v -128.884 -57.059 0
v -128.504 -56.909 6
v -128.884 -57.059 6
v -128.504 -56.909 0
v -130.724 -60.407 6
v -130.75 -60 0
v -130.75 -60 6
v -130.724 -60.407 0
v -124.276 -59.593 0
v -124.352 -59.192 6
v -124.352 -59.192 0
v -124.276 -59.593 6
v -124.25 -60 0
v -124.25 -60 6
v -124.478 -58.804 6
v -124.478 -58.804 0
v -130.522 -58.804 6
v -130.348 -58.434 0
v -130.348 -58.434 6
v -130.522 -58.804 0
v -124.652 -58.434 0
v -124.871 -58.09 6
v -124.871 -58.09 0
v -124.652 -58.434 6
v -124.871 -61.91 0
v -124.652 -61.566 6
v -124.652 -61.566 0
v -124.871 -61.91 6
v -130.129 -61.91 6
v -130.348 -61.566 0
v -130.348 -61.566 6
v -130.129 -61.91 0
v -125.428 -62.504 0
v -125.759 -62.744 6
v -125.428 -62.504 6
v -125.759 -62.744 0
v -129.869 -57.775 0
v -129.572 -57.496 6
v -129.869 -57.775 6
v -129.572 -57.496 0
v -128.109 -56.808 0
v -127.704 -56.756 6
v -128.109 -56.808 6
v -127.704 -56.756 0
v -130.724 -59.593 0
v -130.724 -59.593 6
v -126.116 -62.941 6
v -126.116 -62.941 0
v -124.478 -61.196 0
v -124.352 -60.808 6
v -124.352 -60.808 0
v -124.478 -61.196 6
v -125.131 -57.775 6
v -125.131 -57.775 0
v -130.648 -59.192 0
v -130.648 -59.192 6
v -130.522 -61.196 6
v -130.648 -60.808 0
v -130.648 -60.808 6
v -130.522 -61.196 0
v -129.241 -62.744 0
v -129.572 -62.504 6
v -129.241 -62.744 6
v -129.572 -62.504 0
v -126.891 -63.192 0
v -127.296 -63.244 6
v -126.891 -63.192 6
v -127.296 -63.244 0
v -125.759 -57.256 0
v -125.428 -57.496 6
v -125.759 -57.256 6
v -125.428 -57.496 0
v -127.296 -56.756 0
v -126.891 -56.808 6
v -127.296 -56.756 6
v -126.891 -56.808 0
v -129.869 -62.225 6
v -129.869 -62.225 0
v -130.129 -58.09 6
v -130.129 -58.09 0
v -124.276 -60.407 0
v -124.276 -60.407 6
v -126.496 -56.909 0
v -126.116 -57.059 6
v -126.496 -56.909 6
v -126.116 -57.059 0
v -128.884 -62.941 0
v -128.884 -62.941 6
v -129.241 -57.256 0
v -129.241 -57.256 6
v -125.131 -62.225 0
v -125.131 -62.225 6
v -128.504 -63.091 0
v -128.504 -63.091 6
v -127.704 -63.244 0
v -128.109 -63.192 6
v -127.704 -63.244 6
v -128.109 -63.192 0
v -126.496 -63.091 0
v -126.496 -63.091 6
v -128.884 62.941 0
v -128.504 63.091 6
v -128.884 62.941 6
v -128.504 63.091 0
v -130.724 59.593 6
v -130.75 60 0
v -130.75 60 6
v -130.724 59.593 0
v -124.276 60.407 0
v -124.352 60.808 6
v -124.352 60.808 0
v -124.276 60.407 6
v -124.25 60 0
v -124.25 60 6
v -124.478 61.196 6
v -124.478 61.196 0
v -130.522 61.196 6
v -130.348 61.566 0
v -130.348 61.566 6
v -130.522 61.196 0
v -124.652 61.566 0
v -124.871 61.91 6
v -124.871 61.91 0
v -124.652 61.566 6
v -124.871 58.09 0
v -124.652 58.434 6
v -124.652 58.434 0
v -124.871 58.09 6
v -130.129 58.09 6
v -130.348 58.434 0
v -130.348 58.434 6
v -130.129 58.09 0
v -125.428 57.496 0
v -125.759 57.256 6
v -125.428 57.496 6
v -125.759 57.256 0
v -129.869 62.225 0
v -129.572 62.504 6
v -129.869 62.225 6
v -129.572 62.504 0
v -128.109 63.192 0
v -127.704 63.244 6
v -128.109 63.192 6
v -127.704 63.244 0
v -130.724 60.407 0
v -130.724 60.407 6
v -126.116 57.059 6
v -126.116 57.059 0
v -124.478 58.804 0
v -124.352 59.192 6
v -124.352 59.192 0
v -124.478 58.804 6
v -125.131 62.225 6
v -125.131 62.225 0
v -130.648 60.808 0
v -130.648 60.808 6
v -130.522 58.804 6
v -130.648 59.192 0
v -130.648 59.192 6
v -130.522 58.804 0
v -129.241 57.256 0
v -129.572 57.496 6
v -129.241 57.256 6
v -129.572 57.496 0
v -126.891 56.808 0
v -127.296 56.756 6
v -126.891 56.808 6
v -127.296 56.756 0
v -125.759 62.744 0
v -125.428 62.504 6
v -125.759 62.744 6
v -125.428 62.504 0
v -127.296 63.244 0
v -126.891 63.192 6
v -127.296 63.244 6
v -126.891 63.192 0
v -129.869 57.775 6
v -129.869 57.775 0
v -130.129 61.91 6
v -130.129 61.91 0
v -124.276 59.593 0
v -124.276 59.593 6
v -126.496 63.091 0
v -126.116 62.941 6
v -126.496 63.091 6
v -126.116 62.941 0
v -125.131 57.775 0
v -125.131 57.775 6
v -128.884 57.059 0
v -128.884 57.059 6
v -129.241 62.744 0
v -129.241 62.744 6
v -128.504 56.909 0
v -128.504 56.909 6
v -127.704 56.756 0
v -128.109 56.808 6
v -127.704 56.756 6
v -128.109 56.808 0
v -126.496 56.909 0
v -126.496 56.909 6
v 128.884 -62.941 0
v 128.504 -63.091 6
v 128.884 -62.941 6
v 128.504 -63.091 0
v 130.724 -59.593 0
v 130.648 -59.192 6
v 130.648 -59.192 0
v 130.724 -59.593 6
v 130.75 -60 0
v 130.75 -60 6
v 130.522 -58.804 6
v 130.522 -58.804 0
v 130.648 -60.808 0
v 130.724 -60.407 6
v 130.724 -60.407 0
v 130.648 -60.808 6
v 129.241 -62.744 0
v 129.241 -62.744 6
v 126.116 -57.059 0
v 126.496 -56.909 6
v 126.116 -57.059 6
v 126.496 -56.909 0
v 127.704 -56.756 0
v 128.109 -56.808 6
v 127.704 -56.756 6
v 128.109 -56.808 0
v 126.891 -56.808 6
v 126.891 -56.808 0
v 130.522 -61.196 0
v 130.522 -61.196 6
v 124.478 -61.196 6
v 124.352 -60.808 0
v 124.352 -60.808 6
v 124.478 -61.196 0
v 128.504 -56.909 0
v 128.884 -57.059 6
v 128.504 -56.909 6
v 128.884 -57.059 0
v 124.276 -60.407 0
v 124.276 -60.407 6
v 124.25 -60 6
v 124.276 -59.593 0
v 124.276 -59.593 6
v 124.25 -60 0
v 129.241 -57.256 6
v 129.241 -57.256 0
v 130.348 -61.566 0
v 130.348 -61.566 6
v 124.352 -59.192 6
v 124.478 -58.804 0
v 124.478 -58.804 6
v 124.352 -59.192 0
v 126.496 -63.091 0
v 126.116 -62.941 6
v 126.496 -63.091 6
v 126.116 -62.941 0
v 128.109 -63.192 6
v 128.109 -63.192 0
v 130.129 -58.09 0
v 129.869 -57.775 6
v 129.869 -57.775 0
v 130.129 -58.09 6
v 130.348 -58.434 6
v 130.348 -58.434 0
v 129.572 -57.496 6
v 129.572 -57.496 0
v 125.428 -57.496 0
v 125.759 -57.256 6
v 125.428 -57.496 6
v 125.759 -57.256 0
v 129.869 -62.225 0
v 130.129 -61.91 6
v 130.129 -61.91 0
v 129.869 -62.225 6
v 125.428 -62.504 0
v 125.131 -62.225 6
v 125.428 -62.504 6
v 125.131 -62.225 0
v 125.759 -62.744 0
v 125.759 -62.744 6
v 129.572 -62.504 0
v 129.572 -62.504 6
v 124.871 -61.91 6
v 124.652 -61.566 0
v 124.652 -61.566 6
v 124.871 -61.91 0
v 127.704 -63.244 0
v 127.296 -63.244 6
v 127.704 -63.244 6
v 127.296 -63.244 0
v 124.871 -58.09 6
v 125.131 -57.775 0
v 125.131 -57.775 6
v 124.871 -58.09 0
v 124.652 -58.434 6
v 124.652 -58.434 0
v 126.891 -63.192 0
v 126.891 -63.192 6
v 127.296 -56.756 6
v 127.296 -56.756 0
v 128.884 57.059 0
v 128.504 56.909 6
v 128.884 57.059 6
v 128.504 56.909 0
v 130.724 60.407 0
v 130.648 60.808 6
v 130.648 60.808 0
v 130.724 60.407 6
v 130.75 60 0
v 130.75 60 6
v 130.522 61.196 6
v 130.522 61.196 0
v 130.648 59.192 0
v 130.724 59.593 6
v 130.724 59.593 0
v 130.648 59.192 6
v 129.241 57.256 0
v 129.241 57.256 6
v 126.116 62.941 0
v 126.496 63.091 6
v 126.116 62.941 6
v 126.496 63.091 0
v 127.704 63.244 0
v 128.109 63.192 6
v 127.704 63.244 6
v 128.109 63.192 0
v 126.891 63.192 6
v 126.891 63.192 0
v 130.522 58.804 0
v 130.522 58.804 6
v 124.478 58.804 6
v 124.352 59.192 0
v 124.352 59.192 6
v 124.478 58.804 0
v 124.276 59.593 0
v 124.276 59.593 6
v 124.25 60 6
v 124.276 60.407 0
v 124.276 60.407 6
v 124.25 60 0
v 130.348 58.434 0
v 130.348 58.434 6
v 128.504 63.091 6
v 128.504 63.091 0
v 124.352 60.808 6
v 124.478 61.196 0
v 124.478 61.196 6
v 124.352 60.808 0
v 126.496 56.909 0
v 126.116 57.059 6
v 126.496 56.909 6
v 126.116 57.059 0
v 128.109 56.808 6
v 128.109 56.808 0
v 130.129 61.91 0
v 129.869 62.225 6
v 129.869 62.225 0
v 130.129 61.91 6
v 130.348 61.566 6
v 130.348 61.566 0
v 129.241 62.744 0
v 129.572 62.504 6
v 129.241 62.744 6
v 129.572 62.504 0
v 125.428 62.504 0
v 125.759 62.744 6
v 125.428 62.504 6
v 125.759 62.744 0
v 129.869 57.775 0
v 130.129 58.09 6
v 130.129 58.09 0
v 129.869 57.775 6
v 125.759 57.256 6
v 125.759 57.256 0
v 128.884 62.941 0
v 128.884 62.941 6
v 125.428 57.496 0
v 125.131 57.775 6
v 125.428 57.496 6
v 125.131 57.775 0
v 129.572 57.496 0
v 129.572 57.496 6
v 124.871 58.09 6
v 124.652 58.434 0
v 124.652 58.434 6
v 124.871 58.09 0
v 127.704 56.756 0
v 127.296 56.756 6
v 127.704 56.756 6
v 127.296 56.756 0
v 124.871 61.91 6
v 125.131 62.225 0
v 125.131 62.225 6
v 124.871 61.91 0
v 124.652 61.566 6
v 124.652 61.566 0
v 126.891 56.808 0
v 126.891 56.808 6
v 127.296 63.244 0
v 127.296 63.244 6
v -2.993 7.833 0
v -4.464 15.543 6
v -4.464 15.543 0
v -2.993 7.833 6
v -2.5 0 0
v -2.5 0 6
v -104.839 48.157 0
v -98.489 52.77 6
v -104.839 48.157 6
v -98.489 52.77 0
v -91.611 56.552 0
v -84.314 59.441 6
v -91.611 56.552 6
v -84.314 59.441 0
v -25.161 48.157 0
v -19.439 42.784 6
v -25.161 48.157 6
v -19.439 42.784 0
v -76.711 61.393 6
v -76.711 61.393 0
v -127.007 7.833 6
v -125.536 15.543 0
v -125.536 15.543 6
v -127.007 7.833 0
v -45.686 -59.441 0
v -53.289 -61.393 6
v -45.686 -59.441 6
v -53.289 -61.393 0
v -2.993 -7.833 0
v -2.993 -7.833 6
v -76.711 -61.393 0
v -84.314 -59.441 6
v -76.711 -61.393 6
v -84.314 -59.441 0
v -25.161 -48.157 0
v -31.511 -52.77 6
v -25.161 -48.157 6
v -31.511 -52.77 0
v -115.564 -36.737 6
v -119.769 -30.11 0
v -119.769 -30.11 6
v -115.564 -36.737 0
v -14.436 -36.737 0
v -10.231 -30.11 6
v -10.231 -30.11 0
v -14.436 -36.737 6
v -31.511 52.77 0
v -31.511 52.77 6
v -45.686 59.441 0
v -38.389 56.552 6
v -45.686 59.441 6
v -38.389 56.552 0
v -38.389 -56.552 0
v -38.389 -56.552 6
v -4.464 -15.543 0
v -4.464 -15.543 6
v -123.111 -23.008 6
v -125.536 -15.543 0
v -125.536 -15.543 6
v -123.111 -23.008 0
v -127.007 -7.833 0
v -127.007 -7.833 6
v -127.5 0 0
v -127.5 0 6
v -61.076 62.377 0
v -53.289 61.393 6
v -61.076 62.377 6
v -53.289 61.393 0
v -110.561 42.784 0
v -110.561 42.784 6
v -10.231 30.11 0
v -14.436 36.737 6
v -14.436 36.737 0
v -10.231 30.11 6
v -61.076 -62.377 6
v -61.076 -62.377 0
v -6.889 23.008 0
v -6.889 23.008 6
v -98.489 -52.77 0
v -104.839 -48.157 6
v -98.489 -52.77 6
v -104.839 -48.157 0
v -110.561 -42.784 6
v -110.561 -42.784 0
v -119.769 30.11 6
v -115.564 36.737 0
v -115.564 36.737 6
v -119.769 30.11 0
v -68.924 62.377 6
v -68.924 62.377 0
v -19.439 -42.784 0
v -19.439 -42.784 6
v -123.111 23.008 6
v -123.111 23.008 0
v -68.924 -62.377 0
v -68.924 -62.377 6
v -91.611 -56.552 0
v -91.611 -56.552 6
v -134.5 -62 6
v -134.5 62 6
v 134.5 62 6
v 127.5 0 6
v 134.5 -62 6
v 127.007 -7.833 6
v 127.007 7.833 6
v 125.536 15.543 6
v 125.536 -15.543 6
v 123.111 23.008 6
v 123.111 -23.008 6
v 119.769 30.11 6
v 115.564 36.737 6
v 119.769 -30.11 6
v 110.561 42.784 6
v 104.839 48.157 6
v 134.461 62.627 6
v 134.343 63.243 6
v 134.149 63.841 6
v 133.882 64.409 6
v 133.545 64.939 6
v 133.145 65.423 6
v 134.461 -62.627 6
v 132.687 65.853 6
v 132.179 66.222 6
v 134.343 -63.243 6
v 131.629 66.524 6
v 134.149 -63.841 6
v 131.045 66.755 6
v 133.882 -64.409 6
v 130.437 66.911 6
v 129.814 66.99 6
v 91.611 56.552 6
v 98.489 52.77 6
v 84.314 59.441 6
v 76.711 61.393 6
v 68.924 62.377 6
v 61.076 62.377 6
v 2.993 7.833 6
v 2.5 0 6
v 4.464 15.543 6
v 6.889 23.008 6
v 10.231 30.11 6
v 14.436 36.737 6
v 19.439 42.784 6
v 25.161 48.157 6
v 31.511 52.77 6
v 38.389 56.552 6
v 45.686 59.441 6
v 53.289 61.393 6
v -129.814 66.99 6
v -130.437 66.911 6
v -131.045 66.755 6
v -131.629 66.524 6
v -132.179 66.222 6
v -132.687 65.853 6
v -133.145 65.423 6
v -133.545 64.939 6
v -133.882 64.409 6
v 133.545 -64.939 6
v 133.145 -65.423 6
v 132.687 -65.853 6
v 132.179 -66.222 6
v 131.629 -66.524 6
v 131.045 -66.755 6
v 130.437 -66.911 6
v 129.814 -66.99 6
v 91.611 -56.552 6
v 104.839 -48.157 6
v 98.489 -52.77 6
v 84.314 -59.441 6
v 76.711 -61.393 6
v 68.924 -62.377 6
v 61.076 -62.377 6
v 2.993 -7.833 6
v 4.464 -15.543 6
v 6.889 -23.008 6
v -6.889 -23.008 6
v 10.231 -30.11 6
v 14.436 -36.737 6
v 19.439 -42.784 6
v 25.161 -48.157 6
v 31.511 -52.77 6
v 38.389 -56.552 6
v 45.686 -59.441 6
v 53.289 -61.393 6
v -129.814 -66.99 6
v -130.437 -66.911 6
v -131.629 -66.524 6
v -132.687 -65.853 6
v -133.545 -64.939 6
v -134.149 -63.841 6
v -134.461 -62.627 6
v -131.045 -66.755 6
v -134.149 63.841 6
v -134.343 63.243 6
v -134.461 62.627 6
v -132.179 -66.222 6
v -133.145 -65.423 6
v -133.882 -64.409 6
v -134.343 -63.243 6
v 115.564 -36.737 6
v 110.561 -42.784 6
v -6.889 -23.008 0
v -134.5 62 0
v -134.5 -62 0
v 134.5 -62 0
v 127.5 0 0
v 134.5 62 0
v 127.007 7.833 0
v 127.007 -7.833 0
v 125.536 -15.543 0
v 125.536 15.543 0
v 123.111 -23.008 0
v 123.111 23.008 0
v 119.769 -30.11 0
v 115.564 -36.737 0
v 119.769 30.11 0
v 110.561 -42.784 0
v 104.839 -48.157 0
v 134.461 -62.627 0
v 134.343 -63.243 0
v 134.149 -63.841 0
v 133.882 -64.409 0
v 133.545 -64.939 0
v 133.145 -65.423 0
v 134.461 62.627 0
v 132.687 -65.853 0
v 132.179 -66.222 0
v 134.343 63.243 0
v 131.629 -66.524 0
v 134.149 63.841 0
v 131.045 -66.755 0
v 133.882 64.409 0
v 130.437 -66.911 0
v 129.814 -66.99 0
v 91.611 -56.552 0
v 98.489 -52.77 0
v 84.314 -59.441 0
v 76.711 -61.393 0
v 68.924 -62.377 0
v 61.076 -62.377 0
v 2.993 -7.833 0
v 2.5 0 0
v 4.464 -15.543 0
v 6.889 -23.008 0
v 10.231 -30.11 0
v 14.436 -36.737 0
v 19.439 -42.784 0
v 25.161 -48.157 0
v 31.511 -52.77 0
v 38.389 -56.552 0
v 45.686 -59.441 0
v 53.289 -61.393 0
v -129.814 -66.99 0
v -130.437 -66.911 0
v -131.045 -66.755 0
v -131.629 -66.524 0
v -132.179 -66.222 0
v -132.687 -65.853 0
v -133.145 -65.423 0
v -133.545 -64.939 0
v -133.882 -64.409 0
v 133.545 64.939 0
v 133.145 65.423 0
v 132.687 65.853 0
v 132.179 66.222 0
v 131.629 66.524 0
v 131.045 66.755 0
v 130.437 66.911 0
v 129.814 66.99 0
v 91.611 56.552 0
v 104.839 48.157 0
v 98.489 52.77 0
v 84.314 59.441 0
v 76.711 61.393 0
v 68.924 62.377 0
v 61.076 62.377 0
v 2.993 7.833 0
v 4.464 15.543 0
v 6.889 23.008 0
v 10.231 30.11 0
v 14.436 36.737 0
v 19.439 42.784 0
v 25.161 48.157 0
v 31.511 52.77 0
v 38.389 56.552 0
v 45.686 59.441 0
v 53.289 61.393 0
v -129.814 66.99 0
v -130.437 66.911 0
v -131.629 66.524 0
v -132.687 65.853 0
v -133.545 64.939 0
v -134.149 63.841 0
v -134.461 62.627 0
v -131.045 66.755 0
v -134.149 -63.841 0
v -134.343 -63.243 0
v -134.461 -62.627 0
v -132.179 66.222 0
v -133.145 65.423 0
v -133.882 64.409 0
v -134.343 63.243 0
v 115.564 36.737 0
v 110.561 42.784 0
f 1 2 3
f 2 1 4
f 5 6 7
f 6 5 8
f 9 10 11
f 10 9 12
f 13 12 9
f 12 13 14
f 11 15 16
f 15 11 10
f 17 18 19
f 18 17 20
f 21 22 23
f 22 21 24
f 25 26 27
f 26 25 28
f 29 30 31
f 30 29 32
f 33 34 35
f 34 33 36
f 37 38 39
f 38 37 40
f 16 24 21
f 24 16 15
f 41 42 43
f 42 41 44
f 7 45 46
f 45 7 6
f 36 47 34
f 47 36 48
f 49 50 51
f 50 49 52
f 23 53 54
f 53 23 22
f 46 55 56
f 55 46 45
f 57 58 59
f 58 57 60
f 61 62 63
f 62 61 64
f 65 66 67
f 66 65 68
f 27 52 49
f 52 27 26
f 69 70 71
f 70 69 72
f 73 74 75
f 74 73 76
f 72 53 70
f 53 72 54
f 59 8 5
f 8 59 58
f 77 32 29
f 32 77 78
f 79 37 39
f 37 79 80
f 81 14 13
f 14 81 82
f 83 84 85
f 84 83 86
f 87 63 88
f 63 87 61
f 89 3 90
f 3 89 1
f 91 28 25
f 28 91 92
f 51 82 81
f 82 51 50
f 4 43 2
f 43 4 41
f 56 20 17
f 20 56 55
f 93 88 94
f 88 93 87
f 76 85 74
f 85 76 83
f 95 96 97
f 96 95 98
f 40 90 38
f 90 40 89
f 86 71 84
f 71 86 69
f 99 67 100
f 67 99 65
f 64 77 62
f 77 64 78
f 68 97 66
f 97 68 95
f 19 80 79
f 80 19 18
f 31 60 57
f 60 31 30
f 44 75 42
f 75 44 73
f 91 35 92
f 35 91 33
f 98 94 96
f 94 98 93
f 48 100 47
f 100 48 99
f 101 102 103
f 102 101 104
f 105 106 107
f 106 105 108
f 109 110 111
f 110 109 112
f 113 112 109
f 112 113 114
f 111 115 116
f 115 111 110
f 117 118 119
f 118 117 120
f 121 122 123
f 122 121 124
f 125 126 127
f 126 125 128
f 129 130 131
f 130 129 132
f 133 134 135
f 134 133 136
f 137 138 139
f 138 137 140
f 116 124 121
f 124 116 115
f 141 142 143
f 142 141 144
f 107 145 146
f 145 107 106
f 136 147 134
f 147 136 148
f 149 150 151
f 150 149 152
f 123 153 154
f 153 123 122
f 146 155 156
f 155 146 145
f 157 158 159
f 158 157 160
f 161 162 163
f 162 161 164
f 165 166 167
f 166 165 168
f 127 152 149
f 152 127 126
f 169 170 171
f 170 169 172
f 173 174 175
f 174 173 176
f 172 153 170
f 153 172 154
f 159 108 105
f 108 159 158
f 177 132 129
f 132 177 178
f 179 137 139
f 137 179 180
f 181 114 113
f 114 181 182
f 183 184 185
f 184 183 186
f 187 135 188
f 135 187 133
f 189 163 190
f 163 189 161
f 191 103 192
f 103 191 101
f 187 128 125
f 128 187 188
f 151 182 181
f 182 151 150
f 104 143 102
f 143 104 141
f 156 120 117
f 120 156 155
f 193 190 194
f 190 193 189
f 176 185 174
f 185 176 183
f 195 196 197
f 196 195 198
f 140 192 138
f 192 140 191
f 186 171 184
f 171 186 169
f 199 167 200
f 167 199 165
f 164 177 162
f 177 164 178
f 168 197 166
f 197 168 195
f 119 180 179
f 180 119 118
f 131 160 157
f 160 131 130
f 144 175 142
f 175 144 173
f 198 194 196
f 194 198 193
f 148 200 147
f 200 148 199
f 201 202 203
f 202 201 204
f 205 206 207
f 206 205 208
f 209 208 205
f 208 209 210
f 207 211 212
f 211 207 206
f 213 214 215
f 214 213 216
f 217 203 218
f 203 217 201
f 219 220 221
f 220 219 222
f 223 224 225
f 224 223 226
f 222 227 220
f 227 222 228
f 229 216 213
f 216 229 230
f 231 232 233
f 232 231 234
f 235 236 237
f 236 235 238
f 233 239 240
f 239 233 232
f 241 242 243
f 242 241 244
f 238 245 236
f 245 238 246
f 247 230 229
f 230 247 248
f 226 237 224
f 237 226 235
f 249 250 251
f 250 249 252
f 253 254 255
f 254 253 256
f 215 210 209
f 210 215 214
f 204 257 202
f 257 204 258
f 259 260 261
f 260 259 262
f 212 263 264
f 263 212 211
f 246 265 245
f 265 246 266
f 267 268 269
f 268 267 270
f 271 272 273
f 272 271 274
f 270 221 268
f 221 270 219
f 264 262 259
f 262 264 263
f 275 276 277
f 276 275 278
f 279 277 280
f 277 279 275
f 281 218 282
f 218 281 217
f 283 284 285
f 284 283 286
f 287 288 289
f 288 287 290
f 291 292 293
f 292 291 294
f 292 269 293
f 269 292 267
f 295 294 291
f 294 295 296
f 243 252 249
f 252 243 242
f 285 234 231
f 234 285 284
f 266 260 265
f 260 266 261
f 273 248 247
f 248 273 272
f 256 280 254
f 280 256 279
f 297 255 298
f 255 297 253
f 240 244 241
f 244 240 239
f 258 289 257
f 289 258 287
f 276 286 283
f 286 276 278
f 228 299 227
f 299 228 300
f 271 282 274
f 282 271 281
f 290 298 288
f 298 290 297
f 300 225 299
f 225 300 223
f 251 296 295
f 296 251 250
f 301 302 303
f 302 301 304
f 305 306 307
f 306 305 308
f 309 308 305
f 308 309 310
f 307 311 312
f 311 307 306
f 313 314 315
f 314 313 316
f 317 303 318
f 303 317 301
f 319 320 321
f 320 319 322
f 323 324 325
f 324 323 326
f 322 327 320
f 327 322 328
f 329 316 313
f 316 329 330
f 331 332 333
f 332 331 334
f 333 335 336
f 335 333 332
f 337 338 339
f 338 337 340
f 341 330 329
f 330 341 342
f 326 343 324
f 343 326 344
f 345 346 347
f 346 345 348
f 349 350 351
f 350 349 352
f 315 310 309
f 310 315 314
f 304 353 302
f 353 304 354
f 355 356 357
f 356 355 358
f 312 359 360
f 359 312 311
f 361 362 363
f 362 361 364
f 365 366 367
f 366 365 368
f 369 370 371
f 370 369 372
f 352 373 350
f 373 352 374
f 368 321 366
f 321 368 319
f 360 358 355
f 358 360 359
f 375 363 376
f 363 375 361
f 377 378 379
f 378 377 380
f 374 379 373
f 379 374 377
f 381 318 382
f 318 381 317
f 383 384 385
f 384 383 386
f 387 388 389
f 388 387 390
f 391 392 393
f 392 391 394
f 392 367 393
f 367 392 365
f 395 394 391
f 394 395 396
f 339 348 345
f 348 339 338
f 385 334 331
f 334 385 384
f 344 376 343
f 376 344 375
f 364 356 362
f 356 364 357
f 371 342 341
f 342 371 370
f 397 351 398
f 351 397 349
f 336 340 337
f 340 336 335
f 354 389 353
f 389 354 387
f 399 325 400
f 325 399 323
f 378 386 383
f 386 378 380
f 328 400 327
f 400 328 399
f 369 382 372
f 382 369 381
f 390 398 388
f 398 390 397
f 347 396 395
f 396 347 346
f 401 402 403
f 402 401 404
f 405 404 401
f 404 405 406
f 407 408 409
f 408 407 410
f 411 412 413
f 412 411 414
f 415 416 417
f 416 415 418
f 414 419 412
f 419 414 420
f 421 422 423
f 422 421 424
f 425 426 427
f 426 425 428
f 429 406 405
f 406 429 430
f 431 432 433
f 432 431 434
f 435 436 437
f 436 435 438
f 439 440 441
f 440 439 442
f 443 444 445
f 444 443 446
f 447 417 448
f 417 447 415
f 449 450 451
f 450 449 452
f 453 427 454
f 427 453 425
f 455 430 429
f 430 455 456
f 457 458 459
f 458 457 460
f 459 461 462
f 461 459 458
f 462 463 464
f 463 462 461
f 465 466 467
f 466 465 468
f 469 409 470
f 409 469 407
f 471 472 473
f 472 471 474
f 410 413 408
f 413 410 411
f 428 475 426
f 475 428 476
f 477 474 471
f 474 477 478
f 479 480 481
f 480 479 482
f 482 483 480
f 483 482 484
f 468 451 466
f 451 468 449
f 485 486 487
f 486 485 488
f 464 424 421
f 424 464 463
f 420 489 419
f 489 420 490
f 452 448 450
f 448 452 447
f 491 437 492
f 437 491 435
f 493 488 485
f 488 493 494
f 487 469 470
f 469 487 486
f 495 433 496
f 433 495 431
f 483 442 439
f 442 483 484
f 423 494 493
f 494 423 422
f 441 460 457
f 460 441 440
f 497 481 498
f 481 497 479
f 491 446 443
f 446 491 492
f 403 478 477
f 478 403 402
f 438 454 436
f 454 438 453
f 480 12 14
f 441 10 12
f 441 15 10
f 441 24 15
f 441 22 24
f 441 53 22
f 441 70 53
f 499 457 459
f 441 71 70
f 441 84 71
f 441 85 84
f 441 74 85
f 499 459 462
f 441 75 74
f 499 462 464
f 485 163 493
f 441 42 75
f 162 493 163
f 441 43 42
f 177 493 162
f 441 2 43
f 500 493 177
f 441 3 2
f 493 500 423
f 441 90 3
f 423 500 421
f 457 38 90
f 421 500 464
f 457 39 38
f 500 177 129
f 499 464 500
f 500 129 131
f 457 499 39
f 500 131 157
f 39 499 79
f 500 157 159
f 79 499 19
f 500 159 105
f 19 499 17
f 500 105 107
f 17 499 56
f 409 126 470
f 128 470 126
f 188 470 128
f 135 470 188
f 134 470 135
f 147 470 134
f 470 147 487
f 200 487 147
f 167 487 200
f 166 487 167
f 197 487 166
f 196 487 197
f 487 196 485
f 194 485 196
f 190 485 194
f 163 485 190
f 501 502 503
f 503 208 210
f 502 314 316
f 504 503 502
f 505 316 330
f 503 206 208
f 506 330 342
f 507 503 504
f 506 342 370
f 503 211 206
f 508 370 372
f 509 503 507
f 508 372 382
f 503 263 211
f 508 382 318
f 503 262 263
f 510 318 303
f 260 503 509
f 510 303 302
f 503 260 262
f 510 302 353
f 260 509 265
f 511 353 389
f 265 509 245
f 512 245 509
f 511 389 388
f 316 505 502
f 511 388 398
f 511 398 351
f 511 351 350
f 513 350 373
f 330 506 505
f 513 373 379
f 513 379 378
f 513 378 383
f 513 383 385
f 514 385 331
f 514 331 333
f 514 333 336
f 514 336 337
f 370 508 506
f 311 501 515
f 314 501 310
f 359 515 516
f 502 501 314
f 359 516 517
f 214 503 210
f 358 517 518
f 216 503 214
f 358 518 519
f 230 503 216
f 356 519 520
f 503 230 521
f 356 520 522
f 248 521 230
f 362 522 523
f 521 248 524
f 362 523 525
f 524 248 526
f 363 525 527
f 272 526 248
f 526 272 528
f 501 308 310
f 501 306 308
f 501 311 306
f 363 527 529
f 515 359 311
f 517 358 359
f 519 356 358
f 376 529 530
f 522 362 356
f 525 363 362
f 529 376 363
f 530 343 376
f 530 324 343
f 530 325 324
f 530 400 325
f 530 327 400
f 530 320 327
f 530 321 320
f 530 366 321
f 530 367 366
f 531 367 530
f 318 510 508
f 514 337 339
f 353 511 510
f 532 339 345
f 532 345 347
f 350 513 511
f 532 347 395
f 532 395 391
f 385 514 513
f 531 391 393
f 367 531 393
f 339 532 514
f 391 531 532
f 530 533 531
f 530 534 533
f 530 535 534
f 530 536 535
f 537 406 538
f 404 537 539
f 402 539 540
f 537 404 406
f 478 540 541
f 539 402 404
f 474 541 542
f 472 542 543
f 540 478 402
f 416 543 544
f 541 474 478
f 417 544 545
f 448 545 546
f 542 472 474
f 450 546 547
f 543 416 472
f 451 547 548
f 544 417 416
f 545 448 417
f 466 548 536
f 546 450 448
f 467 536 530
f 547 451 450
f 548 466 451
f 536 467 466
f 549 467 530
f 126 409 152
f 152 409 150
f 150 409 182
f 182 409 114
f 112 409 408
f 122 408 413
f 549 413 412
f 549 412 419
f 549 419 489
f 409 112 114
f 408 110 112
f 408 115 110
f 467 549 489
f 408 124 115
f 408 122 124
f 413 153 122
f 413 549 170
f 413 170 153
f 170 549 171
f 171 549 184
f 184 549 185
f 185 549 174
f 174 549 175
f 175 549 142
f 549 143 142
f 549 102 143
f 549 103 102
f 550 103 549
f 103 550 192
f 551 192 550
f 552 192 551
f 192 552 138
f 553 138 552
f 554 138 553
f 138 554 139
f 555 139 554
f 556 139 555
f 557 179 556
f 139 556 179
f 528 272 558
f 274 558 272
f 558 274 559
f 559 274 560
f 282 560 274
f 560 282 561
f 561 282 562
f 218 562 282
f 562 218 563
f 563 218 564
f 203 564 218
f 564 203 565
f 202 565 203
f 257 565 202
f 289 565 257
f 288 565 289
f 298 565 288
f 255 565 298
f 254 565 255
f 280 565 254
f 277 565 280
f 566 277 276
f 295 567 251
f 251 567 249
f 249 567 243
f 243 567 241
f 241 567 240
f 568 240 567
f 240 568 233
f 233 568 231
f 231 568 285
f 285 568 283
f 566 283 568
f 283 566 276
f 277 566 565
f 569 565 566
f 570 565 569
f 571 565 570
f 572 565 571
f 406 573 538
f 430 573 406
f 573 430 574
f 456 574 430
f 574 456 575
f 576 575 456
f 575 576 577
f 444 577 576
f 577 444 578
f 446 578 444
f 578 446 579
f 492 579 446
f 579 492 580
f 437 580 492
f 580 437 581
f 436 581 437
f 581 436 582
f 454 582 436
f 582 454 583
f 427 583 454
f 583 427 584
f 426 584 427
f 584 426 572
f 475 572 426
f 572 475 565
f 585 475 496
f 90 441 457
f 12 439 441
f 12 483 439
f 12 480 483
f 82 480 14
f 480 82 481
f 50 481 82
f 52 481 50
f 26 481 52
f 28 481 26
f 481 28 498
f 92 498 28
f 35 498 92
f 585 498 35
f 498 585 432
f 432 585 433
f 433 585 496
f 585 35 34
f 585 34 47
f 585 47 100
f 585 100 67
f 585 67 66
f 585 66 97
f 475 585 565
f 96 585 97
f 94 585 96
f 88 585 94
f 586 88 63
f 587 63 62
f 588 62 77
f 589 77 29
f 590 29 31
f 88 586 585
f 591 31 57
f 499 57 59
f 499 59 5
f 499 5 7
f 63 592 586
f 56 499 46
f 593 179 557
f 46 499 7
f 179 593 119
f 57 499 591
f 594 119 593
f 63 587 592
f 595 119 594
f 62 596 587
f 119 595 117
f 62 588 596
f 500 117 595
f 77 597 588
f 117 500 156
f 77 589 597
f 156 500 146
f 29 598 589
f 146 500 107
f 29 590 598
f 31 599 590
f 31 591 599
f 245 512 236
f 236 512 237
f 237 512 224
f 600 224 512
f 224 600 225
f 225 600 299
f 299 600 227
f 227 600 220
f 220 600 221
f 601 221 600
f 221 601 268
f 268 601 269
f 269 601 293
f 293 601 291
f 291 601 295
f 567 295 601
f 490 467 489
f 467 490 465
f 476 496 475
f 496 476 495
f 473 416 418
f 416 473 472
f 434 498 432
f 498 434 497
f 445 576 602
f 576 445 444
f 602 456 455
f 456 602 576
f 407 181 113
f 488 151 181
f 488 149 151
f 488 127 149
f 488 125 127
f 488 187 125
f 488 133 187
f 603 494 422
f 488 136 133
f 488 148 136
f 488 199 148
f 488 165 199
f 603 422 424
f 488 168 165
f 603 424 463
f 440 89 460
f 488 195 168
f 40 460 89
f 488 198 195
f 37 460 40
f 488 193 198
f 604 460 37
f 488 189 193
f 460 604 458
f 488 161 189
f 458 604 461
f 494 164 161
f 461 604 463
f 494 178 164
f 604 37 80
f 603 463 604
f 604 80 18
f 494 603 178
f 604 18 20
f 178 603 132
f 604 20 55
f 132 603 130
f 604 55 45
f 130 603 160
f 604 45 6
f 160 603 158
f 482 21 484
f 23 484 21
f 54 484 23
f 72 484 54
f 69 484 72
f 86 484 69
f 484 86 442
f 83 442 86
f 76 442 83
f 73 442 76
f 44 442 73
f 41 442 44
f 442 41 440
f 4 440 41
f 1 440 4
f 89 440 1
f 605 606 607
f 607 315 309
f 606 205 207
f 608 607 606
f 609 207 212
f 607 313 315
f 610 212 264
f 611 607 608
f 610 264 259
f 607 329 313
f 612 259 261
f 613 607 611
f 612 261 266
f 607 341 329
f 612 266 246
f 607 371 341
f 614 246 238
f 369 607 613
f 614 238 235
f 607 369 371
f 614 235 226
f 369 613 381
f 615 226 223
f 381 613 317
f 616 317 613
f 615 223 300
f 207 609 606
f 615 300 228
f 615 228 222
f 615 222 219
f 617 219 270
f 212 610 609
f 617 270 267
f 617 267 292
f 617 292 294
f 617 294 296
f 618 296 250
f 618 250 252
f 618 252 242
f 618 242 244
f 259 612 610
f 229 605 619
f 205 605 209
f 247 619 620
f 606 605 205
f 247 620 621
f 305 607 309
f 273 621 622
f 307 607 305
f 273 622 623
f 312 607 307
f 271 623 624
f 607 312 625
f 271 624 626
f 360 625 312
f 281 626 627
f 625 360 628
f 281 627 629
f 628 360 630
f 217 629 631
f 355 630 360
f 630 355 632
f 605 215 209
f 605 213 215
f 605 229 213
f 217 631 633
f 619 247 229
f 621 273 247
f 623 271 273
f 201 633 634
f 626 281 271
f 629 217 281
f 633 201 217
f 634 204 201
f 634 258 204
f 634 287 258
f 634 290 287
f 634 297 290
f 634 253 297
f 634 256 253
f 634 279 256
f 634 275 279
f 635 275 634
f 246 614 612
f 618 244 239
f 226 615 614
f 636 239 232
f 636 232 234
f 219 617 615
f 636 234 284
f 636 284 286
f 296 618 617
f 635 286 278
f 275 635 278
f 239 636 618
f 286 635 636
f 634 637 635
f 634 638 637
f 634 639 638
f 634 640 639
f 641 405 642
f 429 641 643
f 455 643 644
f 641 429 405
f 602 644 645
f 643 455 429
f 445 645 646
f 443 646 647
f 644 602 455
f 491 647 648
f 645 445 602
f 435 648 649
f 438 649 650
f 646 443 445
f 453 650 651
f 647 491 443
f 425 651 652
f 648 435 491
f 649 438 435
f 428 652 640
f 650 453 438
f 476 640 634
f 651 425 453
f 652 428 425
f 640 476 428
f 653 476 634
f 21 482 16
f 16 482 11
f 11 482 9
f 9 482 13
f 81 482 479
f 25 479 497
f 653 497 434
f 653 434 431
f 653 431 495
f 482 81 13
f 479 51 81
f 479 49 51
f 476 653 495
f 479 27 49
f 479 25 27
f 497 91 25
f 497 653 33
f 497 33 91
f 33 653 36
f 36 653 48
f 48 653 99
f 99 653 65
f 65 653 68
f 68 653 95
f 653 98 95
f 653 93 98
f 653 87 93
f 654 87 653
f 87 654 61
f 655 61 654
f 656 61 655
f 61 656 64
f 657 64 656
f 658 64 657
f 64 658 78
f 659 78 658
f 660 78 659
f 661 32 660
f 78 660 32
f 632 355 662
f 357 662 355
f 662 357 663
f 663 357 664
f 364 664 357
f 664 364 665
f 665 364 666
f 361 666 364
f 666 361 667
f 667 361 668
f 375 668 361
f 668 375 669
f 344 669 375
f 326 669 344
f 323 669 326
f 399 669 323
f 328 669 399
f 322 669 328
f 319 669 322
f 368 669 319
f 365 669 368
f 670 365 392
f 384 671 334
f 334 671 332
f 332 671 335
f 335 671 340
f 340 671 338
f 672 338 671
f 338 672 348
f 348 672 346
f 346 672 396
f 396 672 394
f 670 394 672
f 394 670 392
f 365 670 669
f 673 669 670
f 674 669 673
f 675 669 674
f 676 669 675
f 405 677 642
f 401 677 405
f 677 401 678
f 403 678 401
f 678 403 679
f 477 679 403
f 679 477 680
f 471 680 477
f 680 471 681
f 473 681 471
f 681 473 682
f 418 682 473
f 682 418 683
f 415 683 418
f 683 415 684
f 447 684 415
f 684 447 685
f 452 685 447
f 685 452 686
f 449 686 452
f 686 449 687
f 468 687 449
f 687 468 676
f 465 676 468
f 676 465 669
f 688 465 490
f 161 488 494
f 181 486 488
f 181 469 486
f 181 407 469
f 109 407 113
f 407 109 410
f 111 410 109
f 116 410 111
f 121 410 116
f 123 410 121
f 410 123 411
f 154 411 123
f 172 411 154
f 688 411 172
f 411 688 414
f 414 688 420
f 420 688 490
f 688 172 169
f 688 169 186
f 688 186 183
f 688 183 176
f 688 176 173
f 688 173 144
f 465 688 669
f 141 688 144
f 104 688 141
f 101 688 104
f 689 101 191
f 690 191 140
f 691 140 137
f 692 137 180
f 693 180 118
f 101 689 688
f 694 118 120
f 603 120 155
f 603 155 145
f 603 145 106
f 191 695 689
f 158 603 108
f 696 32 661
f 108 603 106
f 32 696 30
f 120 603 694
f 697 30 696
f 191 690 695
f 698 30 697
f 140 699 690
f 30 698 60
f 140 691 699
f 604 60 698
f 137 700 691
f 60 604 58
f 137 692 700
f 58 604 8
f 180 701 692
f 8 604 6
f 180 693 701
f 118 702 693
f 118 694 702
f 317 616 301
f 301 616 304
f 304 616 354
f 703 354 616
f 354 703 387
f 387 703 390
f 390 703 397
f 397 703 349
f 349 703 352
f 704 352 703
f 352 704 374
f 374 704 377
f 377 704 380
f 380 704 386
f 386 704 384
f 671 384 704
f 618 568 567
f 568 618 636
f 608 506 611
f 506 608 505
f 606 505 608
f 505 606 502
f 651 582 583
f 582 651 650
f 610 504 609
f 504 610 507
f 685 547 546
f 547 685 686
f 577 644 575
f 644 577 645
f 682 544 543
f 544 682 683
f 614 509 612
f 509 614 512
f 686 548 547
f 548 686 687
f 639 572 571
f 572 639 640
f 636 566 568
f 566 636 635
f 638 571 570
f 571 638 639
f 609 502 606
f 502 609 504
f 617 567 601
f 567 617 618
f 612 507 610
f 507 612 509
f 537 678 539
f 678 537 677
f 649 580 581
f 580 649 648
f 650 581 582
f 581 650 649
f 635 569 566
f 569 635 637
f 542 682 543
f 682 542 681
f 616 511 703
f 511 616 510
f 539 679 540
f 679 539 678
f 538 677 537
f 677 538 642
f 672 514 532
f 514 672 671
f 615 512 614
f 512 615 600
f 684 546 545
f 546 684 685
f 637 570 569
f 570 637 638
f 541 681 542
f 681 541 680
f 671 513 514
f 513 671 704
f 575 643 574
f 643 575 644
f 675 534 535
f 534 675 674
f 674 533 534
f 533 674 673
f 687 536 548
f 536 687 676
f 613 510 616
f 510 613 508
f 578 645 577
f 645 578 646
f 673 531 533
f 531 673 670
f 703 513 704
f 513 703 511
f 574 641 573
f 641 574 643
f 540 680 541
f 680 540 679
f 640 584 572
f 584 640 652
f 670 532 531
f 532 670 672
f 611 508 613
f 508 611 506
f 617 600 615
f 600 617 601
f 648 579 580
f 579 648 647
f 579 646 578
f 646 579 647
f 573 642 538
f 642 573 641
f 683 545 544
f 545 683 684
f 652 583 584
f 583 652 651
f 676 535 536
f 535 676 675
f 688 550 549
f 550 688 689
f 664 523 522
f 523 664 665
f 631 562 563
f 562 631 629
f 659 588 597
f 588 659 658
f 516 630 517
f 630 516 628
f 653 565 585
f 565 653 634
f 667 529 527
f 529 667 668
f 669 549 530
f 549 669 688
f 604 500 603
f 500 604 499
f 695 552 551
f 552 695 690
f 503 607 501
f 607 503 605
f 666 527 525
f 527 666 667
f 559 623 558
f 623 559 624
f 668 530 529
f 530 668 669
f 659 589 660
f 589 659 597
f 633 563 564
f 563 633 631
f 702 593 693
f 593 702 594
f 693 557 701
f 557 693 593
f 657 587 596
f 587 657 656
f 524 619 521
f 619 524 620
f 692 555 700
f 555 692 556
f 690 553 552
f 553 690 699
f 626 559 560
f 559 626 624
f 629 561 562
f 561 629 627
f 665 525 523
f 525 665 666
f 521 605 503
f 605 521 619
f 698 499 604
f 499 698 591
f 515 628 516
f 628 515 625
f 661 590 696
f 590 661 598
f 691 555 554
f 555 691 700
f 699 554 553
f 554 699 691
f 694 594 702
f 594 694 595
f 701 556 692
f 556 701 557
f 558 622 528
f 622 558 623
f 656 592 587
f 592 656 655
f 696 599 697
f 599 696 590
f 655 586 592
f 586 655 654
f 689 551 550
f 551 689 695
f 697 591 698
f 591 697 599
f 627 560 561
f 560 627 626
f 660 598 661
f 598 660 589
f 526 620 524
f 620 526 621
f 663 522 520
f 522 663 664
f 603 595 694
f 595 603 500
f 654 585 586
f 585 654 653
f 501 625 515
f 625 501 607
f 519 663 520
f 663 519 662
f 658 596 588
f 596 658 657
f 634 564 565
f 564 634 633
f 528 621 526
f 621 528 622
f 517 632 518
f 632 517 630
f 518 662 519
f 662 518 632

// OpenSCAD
$fn = 50;


difference() {
	union() {
		hull() {
			translate(v = [-129.5000000000, 62.0000000000, 0]) {
				cylinder(h = 6, r = 5);
			}
			translate(v = [129.5000000000, 62.0000000000, 0]) {
				cylinder(h = 6, r = 5);
			}
			translate(v = [-129.5000000000, -62.0000000000, 0]) {
				cylinder(h = 6, r = 5);
			}
			translate(v = [129.5000000000, -62.0000000000, 0]) {
				cylinder(h = 6, r = 5);
			}
		}
	}
	union() {
		#translate(v = [-127.5000000000, -60.0000000000, -100.0000000000]) {
			cylinder(h = 200, r = 3.2500000000);
		}
		#translate(v = [-127.5000000000, 60.0000000000, -100.0000000000]) {
			cylinder(h = 200, r = 3.2500000000);
		}
		#translate(v = [127.5000000000, -60.0000000000, -100.0000000000]) {
			cylinder(h = 200, r = 3.2500000000);
		}
		#translate(v = [127.5000000000, 60.0000000000, -100.0000000000]) {
			cylinder(h = 200, r = 3.2500000000);
		}
		#translate(v = [-65.0000000000, 0, 0]) {
			cylinder(h = 6, r = 62.5000000000);
		}
		#translate(v = [65.0000000000, 0, 0]) {
			cylinder(h = 6, r = 62.5000000000);
		}
	}
}
